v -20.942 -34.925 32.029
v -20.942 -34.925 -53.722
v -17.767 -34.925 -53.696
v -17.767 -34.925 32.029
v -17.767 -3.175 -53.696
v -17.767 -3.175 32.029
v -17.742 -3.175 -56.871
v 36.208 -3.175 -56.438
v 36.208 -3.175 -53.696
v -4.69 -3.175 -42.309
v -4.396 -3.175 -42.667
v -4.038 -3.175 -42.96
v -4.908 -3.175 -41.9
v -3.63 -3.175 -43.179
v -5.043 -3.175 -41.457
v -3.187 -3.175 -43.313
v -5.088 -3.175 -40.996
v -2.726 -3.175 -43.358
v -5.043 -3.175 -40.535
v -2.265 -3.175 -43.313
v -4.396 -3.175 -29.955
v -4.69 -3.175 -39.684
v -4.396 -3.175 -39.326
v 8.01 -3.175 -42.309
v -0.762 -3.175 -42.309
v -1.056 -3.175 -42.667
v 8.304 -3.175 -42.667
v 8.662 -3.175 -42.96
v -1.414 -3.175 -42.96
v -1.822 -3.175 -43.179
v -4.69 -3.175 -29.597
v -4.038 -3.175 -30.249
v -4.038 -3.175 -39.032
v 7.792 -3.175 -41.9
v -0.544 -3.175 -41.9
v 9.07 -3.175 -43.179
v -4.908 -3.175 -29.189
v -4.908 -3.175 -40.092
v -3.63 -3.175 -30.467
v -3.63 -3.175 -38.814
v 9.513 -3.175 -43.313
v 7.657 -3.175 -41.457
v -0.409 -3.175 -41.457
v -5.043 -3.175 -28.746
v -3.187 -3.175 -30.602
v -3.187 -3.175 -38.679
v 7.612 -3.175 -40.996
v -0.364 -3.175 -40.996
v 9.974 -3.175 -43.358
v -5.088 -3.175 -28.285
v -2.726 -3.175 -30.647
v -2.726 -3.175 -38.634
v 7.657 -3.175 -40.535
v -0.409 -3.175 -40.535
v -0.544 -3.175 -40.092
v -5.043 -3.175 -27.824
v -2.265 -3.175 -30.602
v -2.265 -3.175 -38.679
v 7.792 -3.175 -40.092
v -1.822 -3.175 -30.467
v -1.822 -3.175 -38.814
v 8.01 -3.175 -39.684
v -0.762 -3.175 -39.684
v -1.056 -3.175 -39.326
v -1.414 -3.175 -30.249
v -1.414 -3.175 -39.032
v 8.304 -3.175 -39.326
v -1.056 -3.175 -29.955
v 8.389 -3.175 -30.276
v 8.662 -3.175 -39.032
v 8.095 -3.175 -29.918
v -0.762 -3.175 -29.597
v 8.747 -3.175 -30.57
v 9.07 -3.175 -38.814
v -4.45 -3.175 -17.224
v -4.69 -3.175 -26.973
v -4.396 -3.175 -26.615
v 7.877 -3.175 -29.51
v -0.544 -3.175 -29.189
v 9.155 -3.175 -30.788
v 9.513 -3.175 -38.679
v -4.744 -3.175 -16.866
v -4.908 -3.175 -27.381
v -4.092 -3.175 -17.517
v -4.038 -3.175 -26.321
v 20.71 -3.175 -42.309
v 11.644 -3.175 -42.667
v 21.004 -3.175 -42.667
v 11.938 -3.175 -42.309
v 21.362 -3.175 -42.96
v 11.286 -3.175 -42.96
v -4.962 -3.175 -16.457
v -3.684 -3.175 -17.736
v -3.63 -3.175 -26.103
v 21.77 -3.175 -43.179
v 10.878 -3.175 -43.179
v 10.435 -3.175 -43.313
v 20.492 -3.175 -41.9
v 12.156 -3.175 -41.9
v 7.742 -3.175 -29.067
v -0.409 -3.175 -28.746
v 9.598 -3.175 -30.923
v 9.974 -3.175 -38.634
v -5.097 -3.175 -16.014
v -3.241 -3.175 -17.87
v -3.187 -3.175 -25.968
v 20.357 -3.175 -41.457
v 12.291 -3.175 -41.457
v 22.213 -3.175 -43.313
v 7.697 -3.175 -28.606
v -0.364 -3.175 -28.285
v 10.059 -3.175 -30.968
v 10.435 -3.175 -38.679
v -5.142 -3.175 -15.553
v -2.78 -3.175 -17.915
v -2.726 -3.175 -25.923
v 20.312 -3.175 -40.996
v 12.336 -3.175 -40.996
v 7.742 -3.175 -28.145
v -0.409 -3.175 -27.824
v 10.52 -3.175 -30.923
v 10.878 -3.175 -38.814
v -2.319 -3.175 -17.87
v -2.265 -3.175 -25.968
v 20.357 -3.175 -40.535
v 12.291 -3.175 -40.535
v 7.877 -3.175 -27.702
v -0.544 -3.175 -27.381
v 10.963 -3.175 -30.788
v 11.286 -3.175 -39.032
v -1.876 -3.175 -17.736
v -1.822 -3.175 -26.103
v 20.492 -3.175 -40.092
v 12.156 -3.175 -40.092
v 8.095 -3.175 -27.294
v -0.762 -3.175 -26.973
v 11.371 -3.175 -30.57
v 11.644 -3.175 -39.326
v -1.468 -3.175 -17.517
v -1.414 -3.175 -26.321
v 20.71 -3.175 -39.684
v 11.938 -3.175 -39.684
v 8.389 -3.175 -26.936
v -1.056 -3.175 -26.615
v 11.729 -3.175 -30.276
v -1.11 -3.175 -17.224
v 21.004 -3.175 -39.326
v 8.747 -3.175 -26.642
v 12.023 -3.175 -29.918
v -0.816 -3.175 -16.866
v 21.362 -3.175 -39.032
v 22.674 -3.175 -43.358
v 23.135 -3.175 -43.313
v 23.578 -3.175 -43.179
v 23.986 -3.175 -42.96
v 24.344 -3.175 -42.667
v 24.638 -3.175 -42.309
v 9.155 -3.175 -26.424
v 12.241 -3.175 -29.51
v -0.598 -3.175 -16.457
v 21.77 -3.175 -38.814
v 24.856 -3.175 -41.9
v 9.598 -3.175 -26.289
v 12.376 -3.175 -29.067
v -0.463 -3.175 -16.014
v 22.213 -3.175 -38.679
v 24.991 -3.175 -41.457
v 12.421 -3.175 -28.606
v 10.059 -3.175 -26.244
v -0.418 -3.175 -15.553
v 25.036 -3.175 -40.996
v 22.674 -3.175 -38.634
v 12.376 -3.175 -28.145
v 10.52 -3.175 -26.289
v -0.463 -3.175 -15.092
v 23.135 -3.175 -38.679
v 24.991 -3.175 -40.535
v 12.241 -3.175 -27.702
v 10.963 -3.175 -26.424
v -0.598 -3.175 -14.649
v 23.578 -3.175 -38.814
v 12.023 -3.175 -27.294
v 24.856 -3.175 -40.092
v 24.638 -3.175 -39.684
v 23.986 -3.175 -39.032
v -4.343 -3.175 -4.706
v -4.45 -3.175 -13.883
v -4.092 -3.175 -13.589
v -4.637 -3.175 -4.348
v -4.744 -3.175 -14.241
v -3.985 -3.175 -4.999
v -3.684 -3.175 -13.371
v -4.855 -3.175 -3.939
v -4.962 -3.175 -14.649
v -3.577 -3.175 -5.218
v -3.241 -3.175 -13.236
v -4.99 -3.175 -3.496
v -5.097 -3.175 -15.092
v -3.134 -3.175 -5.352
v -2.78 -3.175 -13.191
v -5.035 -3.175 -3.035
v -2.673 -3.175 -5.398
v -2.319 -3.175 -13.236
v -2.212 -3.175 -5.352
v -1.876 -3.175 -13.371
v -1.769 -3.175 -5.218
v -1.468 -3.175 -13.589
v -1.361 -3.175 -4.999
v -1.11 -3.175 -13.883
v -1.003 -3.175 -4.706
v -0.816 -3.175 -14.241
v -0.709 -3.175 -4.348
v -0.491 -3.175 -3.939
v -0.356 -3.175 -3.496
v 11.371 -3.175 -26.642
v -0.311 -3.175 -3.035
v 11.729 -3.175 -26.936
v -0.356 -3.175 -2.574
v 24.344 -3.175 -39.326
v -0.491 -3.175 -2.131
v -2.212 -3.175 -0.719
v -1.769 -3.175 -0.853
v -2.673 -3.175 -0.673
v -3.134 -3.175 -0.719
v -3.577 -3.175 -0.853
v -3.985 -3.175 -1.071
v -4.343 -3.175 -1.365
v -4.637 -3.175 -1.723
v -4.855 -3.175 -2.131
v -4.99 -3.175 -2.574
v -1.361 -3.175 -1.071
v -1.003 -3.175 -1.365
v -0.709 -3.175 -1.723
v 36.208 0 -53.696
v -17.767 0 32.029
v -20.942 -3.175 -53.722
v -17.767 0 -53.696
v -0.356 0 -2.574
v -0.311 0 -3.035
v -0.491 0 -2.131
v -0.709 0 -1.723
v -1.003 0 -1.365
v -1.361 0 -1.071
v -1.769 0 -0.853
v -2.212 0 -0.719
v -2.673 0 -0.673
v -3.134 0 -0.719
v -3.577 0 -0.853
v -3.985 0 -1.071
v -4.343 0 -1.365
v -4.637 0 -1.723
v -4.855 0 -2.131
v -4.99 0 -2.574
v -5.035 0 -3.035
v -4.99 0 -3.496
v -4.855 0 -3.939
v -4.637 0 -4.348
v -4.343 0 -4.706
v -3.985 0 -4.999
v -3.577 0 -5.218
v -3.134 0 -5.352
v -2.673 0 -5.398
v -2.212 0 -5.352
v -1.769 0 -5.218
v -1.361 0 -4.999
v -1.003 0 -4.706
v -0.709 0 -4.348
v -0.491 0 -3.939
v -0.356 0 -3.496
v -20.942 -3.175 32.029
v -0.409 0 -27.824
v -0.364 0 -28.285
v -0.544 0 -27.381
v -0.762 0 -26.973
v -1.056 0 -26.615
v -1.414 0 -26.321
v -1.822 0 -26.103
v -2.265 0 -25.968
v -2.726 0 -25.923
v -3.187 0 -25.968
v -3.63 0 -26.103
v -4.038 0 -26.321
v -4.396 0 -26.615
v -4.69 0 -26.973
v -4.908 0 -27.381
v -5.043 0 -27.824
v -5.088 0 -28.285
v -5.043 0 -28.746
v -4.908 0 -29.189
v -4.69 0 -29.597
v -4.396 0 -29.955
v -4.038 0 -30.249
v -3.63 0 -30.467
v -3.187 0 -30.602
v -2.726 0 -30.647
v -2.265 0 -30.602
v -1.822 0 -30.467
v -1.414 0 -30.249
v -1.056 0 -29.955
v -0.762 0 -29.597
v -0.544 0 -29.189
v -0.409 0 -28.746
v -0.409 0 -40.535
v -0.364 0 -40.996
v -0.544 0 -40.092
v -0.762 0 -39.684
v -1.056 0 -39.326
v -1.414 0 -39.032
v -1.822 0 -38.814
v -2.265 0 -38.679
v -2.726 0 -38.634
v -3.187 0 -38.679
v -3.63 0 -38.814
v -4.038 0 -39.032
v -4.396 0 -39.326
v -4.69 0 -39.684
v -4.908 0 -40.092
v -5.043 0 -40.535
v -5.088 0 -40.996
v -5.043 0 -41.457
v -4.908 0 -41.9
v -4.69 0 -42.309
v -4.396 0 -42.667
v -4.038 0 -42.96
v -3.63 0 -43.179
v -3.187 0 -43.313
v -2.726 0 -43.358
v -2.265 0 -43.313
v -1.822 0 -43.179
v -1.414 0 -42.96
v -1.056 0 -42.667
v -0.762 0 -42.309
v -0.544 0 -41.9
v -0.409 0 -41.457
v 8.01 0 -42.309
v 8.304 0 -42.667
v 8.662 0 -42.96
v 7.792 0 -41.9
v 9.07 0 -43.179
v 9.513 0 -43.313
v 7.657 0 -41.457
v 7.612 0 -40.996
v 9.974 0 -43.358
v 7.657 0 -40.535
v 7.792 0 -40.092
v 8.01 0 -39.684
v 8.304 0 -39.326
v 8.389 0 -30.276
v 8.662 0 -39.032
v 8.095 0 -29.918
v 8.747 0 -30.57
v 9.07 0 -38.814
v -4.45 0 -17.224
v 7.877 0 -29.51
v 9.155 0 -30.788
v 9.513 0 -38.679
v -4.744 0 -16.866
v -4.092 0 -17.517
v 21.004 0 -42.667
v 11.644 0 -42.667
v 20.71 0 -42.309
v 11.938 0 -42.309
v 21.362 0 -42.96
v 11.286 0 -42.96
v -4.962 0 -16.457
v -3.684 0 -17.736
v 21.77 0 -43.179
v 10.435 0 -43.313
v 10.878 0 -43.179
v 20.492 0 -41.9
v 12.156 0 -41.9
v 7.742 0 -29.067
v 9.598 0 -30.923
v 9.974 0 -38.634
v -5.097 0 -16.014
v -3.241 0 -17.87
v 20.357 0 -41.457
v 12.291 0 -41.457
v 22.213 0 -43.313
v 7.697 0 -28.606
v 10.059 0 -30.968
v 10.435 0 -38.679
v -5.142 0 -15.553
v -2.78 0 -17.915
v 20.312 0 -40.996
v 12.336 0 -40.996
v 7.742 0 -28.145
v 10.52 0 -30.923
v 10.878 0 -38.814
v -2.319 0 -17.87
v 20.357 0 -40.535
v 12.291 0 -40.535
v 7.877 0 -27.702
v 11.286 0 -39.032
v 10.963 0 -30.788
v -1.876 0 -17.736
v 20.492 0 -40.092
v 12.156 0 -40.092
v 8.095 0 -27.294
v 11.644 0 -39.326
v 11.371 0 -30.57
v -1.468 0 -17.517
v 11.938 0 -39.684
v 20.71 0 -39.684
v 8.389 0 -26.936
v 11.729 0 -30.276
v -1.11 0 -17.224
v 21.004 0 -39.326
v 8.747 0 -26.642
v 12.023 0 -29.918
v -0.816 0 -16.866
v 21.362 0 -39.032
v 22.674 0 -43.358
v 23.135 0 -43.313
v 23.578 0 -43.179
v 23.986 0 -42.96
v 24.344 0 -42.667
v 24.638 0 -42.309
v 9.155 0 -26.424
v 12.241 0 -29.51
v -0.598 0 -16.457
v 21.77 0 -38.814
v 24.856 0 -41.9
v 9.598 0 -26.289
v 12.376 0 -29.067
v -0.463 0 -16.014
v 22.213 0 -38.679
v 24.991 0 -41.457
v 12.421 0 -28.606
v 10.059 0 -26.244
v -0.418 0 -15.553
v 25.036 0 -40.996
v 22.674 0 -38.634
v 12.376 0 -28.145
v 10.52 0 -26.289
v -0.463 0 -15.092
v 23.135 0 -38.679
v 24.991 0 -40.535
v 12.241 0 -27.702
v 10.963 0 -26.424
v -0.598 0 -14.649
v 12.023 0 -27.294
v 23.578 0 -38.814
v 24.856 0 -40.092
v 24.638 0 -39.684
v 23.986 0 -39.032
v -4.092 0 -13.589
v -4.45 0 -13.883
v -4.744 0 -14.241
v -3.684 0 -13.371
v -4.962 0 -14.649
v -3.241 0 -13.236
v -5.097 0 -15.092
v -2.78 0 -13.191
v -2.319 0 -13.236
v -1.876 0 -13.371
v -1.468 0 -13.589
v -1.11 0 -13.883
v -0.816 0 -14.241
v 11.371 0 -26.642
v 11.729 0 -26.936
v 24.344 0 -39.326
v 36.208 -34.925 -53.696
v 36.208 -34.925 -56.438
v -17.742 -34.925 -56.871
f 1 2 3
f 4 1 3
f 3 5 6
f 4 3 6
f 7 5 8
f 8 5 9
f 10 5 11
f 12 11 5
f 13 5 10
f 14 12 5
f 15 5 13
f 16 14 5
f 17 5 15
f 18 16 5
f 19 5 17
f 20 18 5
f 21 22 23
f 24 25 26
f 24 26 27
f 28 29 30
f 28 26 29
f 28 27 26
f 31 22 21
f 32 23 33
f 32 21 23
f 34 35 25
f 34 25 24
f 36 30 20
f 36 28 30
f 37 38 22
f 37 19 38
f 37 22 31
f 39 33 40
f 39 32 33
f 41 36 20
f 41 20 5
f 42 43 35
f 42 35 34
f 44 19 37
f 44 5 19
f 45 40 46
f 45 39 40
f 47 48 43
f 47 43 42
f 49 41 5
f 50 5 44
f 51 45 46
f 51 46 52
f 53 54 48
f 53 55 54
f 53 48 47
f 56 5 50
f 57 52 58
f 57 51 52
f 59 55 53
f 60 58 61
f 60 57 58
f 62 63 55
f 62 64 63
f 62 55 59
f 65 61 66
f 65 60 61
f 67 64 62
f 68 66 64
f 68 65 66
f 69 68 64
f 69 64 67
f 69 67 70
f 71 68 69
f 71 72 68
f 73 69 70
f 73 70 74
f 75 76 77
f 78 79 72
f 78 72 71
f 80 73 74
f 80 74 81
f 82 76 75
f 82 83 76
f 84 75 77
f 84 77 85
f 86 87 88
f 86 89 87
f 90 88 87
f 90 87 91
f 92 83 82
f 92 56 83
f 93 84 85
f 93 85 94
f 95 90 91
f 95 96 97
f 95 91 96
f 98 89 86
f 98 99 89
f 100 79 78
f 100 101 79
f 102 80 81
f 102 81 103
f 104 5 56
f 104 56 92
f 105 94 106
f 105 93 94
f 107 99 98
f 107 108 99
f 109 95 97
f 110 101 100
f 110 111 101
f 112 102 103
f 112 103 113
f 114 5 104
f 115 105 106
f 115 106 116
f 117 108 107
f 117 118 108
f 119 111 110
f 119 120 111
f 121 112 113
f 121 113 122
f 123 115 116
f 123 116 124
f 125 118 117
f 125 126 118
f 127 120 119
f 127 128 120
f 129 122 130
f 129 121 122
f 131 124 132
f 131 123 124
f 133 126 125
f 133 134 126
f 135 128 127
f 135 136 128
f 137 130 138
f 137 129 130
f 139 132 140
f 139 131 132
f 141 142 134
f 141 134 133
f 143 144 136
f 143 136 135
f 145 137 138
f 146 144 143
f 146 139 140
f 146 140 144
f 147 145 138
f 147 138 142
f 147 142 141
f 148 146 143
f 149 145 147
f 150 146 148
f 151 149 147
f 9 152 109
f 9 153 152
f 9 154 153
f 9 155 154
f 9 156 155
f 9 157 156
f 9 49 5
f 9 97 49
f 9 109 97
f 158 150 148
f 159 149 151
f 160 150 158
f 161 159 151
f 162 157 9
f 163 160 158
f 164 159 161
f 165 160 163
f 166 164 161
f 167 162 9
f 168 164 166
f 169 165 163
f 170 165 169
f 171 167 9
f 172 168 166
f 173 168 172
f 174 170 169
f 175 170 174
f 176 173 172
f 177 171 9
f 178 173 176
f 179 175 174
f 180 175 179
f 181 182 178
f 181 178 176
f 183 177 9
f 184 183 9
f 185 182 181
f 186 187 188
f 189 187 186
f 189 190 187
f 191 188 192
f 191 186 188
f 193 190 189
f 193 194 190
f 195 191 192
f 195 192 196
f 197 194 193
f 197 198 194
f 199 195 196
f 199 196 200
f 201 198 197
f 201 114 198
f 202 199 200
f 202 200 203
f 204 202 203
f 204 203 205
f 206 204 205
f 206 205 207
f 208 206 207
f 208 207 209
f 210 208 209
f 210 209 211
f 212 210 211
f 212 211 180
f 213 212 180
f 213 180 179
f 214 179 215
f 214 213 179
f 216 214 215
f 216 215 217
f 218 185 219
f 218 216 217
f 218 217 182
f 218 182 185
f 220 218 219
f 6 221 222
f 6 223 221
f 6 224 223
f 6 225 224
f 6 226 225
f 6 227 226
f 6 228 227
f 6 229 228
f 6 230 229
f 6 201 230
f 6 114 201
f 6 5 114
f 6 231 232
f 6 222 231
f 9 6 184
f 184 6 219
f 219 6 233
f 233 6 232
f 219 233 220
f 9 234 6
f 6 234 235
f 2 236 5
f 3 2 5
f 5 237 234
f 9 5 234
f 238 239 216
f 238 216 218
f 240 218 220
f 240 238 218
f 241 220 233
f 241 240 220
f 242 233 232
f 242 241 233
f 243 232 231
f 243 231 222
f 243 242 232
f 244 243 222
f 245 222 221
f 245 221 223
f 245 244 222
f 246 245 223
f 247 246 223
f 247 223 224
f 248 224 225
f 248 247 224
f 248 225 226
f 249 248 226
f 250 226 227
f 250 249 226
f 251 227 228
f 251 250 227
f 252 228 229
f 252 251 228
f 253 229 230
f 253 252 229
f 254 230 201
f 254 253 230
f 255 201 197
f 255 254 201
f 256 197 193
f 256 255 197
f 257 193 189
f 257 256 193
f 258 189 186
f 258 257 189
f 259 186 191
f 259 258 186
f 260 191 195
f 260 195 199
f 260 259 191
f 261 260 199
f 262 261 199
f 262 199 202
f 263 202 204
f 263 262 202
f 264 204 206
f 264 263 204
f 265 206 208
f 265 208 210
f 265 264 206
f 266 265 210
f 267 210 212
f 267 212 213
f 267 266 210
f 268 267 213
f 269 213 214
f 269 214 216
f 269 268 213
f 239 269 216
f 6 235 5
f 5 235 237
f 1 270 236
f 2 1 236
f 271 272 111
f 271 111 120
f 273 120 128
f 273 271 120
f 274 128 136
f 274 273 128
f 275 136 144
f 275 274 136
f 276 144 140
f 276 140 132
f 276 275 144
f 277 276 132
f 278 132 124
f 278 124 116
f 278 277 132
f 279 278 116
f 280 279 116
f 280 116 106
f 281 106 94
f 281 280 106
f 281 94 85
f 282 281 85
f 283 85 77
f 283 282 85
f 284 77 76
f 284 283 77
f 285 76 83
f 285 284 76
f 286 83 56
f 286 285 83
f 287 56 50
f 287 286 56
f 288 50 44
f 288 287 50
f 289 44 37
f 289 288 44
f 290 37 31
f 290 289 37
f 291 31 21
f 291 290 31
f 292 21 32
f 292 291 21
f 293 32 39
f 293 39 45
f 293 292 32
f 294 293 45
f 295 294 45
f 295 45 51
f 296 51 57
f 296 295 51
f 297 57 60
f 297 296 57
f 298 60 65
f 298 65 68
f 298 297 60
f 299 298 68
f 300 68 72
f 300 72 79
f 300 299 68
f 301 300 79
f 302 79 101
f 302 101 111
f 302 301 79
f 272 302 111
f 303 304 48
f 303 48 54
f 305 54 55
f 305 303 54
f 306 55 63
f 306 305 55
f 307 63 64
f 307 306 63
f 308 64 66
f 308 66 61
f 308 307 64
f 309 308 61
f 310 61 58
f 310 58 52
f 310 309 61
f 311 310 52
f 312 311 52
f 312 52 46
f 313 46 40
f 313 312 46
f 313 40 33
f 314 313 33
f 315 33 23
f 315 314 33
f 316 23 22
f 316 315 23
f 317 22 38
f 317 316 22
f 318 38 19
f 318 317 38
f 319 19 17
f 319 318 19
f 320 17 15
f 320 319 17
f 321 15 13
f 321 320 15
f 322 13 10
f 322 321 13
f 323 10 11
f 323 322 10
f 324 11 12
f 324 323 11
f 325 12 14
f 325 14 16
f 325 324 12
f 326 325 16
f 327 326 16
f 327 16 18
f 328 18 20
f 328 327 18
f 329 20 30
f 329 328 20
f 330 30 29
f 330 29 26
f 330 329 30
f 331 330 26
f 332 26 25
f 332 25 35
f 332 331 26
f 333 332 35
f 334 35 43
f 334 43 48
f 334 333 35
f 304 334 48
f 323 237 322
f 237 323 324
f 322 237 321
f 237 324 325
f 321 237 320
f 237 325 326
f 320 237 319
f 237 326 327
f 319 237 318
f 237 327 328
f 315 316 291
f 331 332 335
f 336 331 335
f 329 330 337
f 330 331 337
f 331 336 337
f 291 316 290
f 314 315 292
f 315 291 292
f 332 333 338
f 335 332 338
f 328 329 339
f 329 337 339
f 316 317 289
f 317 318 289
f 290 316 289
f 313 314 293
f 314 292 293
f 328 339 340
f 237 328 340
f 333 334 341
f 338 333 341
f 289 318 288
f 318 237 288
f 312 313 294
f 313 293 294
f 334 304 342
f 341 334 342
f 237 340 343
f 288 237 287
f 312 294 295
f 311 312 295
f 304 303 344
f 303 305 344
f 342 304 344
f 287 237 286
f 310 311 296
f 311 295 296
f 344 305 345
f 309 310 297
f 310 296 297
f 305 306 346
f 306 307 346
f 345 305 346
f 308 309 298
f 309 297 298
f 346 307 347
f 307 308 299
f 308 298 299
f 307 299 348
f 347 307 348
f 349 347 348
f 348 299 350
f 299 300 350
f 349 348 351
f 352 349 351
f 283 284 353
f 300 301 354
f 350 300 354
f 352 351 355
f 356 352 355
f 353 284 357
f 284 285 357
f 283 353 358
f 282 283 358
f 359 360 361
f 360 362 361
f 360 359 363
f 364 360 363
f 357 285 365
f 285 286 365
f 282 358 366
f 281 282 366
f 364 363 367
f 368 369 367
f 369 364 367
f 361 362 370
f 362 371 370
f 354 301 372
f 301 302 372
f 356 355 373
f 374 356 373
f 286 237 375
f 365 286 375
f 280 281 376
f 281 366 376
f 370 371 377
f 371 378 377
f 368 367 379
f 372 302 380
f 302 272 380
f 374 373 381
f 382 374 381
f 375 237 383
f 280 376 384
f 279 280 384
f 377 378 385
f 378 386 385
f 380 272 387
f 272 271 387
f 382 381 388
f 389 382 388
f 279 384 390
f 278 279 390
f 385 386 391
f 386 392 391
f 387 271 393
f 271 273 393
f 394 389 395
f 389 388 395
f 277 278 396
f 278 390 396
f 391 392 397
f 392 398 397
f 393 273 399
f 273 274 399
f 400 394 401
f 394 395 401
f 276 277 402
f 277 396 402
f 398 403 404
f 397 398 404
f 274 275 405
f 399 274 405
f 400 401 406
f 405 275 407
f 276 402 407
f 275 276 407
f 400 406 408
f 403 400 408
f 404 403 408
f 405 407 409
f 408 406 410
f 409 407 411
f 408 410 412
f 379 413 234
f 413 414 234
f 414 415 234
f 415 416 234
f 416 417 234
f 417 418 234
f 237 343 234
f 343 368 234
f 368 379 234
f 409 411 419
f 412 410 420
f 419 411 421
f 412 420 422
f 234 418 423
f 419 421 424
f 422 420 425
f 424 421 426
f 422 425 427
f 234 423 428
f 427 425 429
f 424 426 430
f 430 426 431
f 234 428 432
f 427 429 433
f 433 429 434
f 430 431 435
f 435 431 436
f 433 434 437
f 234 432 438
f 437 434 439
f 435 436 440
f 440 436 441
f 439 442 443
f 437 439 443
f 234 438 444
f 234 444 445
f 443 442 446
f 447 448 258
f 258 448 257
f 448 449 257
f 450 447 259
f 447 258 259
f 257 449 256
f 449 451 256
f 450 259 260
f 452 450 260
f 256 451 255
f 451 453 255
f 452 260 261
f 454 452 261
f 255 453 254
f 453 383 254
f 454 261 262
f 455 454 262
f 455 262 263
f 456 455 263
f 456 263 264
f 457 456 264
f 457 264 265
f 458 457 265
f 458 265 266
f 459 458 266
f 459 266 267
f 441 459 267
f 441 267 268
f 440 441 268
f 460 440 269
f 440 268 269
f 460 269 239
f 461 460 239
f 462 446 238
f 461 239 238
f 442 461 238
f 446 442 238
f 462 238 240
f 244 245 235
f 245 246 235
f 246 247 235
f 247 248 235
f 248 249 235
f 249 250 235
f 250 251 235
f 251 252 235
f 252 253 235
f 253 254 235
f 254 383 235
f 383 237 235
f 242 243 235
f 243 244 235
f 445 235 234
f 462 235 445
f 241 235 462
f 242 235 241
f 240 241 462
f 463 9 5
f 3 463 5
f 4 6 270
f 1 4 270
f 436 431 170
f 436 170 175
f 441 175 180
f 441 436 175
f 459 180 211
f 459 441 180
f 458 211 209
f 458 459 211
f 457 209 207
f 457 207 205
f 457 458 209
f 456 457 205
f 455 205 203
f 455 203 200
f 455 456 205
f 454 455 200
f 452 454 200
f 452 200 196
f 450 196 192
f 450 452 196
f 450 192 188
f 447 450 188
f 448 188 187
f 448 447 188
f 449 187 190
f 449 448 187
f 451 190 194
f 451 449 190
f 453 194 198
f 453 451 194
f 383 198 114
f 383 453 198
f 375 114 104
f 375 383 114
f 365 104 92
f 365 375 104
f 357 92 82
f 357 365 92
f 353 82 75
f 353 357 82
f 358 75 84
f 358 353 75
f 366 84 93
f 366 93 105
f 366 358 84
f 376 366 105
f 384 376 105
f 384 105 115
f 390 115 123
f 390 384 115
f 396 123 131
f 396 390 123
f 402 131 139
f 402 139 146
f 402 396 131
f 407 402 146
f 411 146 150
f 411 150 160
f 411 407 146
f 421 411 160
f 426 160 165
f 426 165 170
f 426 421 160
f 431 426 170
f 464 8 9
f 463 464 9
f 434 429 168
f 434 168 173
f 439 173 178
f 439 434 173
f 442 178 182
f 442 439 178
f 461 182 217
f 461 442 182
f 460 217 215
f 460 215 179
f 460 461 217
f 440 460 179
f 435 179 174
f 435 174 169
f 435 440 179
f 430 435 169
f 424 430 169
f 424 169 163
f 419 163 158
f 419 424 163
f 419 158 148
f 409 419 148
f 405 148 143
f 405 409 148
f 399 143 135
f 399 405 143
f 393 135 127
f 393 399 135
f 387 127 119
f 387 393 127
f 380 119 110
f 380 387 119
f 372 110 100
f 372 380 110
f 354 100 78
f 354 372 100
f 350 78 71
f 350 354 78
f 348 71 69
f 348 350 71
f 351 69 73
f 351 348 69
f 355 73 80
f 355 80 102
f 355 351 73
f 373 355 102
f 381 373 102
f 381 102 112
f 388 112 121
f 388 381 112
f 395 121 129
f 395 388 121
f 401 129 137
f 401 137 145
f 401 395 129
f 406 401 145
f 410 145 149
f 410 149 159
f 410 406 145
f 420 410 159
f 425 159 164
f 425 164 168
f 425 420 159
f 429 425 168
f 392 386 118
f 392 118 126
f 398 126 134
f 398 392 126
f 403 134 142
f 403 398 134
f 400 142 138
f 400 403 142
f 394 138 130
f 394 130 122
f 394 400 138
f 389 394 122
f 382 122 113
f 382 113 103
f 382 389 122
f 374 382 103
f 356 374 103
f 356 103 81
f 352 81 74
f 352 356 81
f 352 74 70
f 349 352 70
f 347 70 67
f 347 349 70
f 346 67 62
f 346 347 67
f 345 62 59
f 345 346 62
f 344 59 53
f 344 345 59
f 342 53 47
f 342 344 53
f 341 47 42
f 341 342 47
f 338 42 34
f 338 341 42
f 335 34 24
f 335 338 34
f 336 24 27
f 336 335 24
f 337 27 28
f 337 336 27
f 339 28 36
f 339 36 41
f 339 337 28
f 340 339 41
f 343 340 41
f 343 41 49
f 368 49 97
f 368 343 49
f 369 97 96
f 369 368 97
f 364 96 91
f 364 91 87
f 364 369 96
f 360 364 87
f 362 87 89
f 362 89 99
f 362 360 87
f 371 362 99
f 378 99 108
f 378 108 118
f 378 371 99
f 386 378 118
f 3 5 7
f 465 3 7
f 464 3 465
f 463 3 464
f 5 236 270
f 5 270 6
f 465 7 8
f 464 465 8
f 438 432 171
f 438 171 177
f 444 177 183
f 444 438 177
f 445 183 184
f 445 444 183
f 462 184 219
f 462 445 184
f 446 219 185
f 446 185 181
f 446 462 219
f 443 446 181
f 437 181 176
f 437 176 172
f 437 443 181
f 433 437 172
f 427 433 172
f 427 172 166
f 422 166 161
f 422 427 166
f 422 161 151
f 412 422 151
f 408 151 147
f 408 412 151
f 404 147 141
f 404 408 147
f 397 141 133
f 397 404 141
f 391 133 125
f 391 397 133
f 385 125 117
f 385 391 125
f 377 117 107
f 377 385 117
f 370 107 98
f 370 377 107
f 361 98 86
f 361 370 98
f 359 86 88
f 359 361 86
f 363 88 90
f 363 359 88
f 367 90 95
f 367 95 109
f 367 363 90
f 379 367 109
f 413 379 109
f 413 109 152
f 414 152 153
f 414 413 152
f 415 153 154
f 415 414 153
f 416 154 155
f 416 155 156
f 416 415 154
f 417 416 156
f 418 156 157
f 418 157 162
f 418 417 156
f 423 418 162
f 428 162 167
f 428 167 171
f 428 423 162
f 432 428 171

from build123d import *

# Parameters (mm, degrees)
F0_R     = 2.3622
F1_DEPTH = 3.175
F3_DEPTH = 31.75


with BuildPart() as f1:
    # F0 (on Front) → F1 (new body)
    with BuildSketch(Plane.XZ):
        Polygon((36.207597, -53.696288), (-17.767403, 32.028712), (-17.767403, -53.696288), align=None)
        with Locations((-2.7259, -40.996288)):
            Circle(F0_R, mode=Mode.SUBTRACT)
        with Locations((-2.7259, -28.285086)):
            Circle(F0_R, mode=Mode.SUBTRACT)
        with Locations((-2.779935, -15.55322)):
            Circle(F0_R, mode=Mode.SUBTRACT)
        with Locations((9.9741, -40.996288)):
            Circle(F0_R, mode=Mode.SUBTRACT)
        with Locations((22.6741, -40.996288)):
            Circle(F0_R, mode=Mode.SUBTRACT)
        with Locations((10.058921, -28.606057)):
            Circle(F0_R, mode=Mode.SUBTRACT)
        with Locations((-2.672945, -3.035336)):
            Circle(F0_R, mode=Mode.SUBTRACT)
    extrude(amount=F1_DEPTH)


with BuildPart() as f3:
    # F2 (on face) → F3 (new body)
    with BuildSketch(Plane.XZ.offset(3.175)):
        Polygon((36.207597, -53.696288), (-17.767403, -53.696288), (-17.741921, -56.871185), (36.207597, -56.43818), align=None)
        Polygon((-17.767403, -53.696288), (-17.767403, 32.028712), (-20.942403, 32.028712), (-20.942403, -53.721771), align=None)
    extrude(amount=F3_DEPTH)


solid = Compound([f1.part, f3.part])
